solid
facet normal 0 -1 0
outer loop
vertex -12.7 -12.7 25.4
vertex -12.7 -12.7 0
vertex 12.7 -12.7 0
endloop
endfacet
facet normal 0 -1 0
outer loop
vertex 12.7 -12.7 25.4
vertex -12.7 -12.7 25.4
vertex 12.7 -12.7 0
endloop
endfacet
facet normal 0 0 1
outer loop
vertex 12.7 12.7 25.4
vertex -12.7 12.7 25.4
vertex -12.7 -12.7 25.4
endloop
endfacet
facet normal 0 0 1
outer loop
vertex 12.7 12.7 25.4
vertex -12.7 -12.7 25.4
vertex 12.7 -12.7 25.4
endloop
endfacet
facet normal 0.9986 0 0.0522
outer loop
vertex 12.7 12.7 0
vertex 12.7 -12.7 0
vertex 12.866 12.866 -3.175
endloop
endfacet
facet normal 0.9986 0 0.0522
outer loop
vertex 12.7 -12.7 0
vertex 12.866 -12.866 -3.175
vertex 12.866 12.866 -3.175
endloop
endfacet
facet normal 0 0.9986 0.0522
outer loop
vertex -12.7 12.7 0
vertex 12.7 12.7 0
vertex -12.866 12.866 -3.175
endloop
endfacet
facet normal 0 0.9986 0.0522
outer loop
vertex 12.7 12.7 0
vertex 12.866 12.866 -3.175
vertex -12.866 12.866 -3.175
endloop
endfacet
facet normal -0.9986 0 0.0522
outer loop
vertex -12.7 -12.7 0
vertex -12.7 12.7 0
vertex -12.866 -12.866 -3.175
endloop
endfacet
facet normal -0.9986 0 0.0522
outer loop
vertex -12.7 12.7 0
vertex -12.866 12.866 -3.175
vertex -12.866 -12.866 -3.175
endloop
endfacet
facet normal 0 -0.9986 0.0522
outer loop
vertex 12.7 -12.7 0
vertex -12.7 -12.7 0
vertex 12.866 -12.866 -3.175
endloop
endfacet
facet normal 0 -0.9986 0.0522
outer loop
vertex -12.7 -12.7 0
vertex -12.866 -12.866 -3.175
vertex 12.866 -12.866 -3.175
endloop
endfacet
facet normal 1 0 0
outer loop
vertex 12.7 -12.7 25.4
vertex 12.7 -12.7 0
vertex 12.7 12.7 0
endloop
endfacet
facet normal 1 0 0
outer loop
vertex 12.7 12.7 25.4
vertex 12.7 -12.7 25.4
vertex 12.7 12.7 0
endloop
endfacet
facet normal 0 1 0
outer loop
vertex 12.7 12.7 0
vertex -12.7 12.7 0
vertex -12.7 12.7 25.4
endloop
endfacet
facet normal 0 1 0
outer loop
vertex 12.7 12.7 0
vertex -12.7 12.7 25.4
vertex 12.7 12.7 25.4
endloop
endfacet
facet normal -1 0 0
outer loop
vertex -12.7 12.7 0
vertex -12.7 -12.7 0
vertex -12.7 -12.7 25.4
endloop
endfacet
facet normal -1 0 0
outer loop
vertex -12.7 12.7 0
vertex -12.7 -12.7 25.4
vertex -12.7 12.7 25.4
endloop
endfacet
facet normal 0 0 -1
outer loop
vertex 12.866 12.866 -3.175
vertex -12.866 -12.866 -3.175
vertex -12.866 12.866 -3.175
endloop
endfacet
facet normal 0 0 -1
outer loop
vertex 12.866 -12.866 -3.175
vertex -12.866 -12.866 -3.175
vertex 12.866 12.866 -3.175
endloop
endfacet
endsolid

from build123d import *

# Parameters (mm, degrees)
F0_W     = 25.4
F0_H     = 25.4
F1_DEPTH = 3.175
F1_TAPER = -3
F2_DEPTH = 25.4


with BuildPart() as f1:
    # F0 (on Top) → F1 (new body)
    with BuildSketch(Plane.XY):
        Rectangle(F0_W, F0_H)
    extrude(amount=-F1_DEPTH, taper=F1_TAPER)

    # F2 (add): a face of the model
    f2_faces = [f1.faces().sort_by_distance(p)[0] for p in [
        (0, 0, 0),
    ]]
    extrude(f2_faces, amount=F2_DEPTH)


solid = f1.part
